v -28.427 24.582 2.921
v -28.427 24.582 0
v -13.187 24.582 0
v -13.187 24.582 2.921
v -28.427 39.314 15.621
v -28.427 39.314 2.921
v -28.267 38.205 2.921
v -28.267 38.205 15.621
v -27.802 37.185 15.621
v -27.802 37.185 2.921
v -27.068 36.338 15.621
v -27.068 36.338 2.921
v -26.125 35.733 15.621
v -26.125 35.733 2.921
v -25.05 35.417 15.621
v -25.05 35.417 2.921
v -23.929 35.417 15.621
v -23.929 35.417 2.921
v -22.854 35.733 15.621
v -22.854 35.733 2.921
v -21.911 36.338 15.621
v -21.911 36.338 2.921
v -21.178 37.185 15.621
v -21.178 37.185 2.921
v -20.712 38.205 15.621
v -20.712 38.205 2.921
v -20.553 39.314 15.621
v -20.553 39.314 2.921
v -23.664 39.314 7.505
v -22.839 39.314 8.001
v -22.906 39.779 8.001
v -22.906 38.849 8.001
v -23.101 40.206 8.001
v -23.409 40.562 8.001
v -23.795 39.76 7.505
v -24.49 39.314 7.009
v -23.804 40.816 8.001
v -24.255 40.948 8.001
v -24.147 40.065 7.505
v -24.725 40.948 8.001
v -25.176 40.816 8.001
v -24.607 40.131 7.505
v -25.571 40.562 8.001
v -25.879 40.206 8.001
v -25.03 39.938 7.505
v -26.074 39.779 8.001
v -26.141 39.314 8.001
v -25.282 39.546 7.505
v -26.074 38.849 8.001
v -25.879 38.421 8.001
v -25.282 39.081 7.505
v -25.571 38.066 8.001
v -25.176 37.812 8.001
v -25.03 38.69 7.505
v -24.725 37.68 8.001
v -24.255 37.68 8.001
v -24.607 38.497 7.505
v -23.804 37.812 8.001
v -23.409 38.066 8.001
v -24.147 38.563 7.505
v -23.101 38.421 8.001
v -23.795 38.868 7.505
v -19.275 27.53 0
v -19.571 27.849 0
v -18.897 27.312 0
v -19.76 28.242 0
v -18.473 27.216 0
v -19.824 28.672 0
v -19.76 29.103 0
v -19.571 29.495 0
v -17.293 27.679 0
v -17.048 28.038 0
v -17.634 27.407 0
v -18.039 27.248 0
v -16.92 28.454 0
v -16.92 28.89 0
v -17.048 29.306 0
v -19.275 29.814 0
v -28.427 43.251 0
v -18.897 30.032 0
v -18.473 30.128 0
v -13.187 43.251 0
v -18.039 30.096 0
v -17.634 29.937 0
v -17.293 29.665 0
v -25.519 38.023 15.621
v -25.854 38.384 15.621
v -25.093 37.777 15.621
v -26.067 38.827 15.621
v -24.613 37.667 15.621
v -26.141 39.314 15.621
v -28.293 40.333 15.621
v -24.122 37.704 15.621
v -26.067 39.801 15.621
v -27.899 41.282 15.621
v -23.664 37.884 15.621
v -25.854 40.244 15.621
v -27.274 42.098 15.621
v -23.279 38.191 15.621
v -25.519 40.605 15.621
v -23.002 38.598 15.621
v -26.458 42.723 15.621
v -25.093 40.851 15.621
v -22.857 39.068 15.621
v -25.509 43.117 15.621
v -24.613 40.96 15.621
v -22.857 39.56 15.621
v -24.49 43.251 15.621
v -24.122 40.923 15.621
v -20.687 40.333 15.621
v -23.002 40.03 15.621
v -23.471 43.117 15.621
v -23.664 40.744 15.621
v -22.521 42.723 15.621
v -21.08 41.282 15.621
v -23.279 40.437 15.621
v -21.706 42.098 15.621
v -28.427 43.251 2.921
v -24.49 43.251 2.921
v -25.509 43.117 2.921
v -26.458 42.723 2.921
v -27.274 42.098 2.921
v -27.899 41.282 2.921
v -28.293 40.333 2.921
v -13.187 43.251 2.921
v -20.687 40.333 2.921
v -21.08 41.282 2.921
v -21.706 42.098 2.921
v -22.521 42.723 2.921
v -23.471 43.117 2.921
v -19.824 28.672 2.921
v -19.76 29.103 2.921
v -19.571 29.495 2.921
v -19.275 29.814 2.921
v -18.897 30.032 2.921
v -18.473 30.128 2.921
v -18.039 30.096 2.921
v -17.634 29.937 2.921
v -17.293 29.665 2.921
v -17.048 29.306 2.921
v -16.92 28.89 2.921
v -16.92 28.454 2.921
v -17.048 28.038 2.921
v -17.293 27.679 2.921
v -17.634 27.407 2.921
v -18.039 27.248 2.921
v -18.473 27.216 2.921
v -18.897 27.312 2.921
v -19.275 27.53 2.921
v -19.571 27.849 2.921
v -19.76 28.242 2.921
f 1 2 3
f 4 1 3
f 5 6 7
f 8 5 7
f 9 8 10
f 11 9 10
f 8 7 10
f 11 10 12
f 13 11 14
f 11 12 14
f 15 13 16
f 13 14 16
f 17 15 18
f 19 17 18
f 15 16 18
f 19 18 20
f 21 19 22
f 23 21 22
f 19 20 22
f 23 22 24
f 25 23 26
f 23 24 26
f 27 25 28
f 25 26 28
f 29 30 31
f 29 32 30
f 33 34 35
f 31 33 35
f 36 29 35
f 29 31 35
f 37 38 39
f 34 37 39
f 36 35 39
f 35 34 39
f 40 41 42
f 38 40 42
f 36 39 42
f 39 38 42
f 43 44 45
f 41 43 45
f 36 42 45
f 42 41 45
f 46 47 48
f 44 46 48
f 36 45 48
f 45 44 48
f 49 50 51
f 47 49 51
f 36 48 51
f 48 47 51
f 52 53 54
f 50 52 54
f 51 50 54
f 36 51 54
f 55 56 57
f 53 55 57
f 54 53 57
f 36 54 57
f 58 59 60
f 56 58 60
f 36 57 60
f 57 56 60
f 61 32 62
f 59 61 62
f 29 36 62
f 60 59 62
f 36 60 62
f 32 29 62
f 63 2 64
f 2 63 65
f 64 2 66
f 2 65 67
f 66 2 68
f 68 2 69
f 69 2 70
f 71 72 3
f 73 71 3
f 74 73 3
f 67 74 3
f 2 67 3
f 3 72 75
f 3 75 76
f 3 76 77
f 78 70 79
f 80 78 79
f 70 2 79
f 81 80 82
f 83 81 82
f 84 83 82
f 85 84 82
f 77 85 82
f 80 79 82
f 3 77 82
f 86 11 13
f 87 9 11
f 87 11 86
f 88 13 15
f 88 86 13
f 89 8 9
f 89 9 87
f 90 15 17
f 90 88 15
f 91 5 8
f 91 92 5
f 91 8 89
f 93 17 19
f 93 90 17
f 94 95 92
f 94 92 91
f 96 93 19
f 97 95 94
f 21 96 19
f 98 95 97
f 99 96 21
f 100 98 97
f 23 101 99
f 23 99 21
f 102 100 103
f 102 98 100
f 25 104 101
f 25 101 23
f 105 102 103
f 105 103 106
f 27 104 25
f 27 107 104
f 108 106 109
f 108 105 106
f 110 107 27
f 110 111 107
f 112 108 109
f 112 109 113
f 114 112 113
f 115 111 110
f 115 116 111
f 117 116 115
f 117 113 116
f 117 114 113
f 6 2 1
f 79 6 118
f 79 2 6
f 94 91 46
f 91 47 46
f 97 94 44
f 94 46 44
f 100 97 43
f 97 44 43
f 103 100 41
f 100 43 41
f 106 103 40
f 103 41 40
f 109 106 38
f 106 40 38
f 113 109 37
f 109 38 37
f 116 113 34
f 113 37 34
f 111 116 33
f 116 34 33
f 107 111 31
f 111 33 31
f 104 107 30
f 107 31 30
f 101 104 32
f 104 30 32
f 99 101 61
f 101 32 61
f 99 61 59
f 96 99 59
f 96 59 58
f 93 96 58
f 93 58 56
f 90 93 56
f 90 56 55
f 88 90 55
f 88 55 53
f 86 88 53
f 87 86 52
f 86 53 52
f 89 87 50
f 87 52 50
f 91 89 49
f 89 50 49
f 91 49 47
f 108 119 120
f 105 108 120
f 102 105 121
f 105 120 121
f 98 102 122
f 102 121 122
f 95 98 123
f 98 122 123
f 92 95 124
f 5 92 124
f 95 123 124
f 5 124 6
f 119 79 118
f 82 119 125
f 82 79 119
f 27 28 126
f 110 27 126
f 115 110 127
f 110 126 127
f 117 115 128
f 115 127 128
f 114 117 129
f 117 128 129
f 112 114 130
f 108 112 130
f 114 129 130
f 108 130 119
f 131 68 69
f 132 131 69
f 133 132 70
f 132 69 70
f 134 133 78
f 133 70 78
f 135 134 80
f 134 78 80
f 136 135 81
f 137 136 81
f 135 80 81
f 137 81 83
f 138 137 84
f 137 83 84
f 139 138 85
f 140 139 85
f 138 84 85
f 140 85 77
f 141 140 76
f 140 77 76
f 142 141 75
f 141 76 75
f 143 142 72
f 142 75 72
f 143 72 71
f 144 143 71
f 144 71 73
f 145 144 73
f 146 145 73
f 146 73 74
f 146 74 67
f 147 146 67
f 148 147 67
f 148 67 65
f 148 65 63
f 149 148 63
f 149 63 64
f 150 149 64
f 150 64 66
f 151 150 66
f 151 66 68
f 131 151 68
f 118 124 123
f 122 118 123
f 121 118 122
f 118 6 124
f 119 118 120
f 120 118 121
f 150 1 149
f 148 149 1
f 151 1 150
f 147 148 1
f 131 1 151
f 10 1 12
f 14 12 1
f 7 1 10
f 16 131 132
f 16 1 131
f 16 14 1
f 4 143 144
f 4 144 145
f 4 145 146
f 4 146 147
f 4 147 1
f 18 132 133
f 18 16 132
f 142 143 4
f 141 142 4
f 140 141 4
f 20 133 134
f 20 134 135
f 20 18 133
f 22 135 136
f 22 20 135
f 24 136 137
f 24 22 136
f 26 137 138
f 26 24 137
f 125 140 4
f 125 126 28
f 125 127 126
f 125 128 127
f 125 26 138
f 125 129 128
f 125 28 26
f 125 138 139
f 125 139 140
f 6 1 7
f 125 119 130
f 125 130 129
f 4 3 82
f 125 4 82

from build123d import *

# Parameters (mm, degrees)
F0_W     = 15.24
F0_H     = 18.669
F1_DEPTH = 2.921
F3_DEPTH = 12.7
F5_D     = 3.302
F5_DEPTH = 7.62
F5_TIP   = 0.992020882
F7_D     = 2.921


with BuildPart() as f1:
    # F0 (on Top) → F1 (new body)
    with BuildSketch(Plane.XY):
        with Locations((-20.8066811628, 33.9163625899)):
            Rectangle(F0_W, F0_H)
    extrude(amount=F1_DEPTH)

    # F2 (on face) → F3 (join)
    with BuildSketch(Plane.XY.offset(2.921)):
        with BuildLine():
            ThreePointArc((-28.4266811628, 39.3138625899), (-24.4896811628, 35.3768625899), (-20.5526811628, 39.3138625899))
            ThreePointArc((-20.5526811628, 39.3138625899), (-21.7058017653, 42.0977419874), (-24.4896811628, 43.2508625899))
            ThreePointArc((-24.4896811628, 43.2508625899), (-27.2735605603, 42.0977419874), (-28.4266811628, 39.3138625899))
        make_face()
    extrude(amount=F3_DEPTH)

    # F5
    with Locations(Plane.XY.offset(15.621)):
        with Locations((-24.4896811628, 39.3138625899)):
            Hole(F5_D / 2, depth=F5_DEPTH)
            with Locations((0, 0, -(F5_DEPTH + F5_TIP / 2))):  # 118° drill point
                Cone(0, F5_D / 2, F5_TIP, mode=Mode.SUBTRACT)

    # F7 (through all)
    with Locations(Plane.XY.offset(2.921)):
        with Locations((-18.3639004827, 28.6720134318)):
            Hole(F7_D / 2)


solid = f1.part
